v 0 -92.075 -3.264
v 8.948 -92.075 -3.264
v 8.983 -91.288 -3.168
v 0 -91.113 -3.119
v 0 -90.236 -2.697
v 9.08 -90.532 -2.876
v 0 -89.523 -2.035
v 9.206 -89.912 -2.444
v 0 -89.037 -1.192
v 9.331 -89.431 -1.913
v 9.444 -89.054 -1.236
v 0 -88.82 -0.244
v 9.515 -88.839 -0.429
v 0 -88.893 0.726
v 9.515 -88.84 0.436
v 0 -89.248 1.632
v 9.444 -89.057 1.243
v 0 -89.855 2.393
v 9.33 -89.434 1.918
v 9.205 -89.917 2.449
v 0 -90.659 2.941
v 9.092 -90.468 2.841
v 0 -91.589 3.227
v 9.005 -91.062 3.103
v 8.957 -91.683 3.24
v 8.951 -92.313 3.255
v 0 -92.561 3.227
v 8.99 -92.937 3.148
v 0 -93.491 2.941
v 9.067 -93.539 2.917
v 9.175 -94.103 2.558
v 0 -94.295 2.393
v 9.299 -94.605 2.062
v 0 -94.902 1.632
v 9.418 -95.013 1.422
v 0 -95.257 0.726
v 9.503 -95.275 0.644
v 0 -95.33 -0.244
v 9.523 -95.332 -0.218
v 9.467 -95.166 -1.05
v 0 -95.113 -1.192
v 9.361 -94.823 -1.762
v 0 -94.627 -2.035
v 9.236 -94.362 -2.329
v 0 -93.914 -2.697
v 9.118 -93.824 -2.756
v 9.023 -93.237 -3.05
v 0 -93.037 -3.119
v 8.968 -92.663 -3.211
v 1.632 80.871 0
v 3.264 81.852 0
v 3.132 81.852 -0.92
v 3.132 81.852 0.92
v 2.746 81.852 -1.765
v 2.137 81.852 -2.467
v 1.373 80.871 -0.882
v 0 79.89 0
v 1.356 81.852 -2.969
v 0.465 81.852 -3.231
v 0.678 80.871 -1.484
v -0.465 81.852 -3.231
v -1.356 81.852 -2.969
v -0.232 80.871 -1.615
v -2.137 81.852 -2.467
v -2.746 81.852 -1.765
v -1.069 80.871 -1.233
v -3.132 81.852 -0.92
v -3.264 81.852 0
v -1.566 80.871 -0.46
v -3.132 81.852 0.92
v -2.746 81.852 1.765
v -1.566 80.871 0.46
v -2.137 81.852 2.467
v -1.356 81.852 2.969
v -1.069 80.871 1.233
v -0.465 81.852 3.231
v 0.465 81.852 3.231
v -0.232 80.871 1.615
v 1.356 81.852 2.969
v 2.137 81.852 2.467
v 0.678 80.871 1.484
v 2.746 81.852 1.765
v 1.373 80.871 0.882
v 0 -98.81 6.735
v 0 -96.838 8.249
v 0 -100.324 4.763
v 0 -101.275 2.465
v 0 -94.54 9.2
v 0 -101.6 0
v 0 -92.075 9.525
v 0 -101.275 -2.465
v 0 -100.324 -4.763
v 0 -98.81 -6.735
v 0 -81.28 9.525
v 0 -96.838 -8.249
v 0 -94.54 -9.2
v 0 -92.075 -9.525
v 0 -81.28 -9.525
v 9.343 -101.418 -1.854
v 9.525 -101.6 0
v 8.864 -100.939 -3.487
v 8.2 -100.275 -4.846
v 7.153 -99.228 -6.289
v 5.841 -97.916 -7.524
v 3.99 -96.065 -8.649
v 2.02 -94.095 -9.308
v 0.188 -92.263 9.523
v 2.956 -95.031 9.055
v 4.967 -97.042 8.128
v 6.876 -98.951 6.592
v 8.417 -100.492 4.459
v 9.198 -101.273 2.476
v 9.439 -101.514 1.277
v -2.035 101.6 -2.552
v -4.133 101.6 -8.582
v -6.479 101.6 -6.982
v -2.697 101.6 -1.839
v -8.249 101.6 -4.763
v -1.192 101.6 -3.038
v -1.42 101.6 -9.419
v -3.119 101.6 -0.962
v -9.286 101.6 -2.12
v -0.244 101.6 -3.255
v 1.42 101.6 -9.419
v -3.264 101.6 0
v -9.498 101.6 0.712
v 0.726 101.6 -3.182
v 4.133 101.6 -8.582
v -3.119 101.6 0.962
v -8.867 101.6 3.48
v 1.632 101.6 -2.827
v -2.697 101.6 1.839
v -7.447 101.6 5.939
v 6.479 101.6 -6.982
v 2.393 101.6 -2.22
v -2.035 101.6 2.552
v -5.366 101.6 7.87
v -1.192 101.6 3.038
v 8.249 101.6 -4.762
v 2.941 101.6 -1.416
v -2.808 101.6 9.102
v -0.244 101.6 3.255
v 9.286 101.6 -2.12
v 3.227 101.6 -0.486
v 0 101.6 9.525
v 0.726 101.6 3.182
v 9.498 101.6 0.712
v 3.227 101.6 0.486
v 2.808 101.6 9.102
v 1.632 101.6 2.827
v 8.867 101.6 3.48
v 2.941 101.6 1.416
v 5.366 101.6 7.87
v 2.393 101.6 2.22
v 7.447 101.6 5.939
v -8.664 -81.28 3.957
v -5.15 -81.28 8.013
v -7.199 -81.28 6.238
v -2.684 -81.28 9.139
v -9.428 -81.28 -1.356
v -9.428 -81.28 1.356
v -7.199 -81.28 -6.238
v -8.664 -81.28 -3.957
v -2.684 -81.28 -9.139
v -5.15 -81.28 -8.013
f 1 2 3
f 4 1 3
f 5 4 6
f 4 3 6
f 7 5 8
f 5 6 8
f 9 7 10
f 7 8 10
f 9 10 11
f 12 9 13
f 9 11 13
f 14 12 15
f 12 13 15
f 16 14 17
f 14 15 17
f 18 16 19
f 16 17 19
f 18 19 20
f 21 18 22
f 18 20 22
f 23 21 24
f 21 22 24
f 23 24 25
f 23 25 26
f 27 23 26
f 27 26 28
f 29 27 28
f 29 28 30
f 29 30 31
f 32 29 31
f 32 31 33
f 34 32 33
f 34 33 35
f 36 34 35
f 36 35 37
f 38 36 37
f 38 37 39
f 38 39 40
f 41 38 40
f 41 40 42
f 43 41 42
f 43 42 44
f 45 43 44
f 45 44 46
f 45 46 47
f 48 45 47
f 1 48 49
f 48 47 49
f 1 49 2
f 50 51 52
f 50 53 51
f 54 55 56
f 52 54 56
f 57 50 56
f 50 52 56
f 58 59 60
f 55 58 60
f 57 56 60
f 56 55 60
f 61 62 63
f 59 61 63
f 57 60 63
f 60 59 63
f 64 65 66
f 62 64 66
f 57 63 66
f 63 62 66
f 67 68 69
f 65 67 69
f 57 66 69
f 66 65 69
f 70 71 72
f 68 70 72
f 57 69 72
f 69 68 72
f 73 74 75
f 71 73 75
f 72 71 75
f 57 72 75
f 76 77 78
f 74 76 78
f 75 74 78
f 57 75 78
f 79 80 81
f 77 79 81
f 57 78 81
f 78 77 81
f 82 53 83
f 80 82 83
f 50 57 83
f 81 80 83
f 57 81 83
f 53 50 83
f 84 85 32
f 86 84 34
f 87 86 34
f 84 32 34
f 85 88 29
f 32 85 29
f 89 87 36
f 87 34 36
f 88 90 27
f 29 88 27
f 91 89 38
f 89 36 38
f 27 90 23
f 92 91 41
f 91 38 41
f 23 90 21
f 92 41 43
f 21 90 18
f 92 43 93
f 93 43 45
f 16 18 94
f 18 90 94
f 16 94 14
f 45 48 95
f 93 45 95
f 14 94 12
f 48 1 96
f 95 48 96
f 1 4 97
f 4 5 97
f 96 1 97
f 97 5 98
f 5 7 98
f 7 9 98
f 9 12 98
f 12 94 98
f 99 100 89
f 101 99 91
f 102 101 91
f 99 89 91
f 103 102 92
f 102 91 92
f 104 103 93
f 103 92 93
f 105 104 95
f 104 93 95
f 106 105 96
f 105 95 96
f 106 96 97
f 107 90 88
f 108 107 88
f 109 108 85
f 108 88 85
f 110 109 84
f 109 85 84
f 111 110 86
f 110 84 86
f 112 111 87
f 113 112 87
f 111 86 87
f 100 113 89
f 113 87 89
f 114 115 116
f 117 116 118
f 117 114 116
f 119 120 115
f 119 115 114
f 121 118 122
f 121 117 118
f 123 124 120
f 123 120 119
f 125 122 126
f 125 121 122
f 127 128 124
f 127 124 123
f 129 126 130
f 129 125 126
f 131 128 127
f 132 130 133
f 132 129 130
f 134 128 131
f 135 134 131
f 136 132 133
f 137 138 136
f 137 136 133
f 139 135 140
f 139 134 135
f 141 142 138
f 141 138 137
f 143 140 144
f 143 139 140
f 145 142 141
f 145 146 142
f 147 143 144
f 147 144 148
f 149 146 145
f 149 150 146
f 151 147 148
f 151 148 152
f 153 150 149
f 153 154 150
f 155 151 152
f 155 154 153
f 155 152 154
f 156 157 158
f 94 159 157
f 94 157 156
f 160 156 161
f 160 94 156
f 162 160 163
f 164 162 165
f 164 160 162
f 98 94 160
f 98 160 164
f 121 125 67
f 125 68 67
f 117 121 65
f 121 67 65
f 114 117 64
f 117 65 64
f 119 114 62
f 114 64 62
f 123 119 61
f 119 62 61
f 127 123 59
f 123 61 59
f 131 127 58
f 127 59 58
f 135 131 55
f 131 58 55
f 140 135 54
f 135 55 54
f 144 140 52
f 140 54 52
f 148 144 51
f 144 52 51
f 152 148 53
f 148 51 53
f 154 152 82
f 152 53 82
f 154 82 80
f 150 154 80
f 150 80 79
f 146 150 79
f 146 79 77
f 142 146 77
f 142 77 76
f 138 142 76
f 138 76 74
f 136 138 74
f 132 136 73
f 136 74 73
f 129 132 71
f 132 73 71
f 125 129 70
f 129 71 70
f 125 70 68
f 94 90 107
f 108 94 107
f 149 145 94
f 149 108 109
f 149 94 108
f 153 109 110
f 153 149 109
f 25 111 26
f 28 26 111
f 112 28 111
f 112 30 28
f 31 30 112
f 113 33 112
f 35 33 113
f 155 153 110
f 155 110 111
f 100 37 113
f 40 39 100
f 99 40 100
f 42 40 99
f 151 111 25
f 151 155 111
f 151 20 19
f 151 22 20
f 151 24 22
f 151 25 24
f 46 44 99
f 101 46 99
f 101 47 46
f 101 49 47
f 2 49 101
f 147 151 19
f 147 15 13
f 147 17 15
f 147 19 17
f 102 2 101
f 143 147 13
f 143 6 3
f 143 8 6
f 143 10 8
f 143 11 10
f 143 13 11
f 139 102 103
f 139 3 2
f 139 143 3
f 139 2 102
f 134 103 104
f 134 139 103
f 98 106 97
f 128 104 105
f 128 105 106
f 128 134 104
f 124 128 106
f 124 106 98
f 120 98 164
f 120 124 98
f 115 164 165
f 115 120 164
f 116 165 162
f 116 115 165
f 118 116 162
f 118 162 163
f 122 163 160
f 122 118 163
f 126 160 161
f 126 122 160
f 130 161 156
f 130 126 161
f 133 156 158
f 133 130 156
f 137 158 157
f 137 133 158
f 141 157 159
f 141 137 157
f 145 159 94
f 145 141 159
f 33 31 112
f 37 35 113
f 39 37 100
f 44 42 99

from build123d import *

# Parameters (mm, degrees)
CROQUIS1_R                     = 9.525
SALIENTE_EXTRUIR1_DEPTH        = 101.6
CROQUIS2_W                     = 19.05
CROQUIS2_H                     = 20.32
CORTAR_EXTRUIR1_DEPTH          = 12.7
CORTAR_EXTRUIR2_DEPTH          = 12.7
TALADRO_ROSCADO_5_16_181_D     = 6.5278
TALADRO_ROSCADO_5_16_181_DEPTH = 22.9235
TALADRO_ROSCADO_5_16_181_TIP   = 1.961148974
TALADRO_ROSCADO_5_16_182_D     = 6.5278
TALADRO_ROSCADO_5_16_182_DEPTH = 19.7485
TALADRO_ROSCADO_5_16_182_TIP   = 1.961148974


with BuildPart() as part:
    # Croquis1 → Saliente-Extruir1 (new, symmetric)
    with BuildSketch(Plane(origin=(0, 0, 0), x_dir=(1, 0, 0), z_dir=(0, 1, 0))):
        with Locations(Location((0, 0, 0), (0, 0, 270))):
            Circle(CROQUIS1_R)
    extrude(amount=SALIENTE_EXTRUIR1_DEPTH, both=True)

    # Croquis2 → Cortar-Extruir1 (cut)
    with BuildSketch(Plane(origin=(0, 0, 0), x_dir=(0, 0, -1), z_dir=(1, 0, 0))):
        with Locations((0, -91.44)):
            Rectangle(CROQUIS2_W, CROQUIS2_H)
    extrude(amount=-CORTAR_EXTRUIR1_DEPTH, mode=Mode.SUBTRACT)

    # Croquis3 → Cortar-Extruir2 (cut)
    with BuildSketch(Plane.ZY):
        with BuildLine():
            ThreePointArc((0, -101.6), (-6.735192091, -98.810192091), (-9.525, -92.075))
            Line((-9.525, -92.075), (-9.525, -101.6))
            Line((-9.525, -101.6), (0, -101.6))
        make_face()
        with BuildLine():
            ThreePointArc((9.525, -92.075), (6.735192091, -98.810192091), (0, -101.6))
            Line((0, -101.6), (9.525, -101.6))
            Line((9.525, -101.6), (9.525, -92.075))
        make_face()
    extrude(amount=-CORTAR_EXTRUIR2_DEPTH, mode=Mode.SUBTRACT)

    # Taladro roscado 5/16-181
    with Locations(Plane.ZY):
        with Locations((0, -92.075)):
            Hole(TALADRO_ROSCADO_5_16_181_D / 2, depth=TALADRO_ROSCADO_5_16_181_DEPTH)
            with Locations((0, 0, -(TALADRO_ROSCADO_5_16_181_DEPTH + TALADRO_ROSCADO_5_16_181_TIP / 2))):  # 118° drill point
                Cone(0, TALADRO_ROSCADO_5_16_181_D / 2, TALADRO_ROSCADO_5_16_181_TIP, mode=Mode.SUBTRACT)

    # Taladro roscado 5/16-182
    with Locations(Plane(origin=(0, 101.6, 0), x_dir=(1, 0, 0), z_dir=(0, 1, 0))):
        with Locations((0, 0)):
            Hole(TALADRO_ROSCADO_5_16_182_D / 2, depth=TALADRO_ROSCADO_5_16_182_DEPTH)
            with Locations((0, 0, -(TALADRO_ROSCADO_5_16_182_DEPTH + TALADRO_ROSCADO_5_16_182_TIP / 2))):  # 118° drill point
                Cone(0, TALADRO_ROSCADO_5_16_182_D / 2, TALADRO_ROSCADO_5_16_182_TIP, mode=Mode.SUBTRACT)


solid = part.part
